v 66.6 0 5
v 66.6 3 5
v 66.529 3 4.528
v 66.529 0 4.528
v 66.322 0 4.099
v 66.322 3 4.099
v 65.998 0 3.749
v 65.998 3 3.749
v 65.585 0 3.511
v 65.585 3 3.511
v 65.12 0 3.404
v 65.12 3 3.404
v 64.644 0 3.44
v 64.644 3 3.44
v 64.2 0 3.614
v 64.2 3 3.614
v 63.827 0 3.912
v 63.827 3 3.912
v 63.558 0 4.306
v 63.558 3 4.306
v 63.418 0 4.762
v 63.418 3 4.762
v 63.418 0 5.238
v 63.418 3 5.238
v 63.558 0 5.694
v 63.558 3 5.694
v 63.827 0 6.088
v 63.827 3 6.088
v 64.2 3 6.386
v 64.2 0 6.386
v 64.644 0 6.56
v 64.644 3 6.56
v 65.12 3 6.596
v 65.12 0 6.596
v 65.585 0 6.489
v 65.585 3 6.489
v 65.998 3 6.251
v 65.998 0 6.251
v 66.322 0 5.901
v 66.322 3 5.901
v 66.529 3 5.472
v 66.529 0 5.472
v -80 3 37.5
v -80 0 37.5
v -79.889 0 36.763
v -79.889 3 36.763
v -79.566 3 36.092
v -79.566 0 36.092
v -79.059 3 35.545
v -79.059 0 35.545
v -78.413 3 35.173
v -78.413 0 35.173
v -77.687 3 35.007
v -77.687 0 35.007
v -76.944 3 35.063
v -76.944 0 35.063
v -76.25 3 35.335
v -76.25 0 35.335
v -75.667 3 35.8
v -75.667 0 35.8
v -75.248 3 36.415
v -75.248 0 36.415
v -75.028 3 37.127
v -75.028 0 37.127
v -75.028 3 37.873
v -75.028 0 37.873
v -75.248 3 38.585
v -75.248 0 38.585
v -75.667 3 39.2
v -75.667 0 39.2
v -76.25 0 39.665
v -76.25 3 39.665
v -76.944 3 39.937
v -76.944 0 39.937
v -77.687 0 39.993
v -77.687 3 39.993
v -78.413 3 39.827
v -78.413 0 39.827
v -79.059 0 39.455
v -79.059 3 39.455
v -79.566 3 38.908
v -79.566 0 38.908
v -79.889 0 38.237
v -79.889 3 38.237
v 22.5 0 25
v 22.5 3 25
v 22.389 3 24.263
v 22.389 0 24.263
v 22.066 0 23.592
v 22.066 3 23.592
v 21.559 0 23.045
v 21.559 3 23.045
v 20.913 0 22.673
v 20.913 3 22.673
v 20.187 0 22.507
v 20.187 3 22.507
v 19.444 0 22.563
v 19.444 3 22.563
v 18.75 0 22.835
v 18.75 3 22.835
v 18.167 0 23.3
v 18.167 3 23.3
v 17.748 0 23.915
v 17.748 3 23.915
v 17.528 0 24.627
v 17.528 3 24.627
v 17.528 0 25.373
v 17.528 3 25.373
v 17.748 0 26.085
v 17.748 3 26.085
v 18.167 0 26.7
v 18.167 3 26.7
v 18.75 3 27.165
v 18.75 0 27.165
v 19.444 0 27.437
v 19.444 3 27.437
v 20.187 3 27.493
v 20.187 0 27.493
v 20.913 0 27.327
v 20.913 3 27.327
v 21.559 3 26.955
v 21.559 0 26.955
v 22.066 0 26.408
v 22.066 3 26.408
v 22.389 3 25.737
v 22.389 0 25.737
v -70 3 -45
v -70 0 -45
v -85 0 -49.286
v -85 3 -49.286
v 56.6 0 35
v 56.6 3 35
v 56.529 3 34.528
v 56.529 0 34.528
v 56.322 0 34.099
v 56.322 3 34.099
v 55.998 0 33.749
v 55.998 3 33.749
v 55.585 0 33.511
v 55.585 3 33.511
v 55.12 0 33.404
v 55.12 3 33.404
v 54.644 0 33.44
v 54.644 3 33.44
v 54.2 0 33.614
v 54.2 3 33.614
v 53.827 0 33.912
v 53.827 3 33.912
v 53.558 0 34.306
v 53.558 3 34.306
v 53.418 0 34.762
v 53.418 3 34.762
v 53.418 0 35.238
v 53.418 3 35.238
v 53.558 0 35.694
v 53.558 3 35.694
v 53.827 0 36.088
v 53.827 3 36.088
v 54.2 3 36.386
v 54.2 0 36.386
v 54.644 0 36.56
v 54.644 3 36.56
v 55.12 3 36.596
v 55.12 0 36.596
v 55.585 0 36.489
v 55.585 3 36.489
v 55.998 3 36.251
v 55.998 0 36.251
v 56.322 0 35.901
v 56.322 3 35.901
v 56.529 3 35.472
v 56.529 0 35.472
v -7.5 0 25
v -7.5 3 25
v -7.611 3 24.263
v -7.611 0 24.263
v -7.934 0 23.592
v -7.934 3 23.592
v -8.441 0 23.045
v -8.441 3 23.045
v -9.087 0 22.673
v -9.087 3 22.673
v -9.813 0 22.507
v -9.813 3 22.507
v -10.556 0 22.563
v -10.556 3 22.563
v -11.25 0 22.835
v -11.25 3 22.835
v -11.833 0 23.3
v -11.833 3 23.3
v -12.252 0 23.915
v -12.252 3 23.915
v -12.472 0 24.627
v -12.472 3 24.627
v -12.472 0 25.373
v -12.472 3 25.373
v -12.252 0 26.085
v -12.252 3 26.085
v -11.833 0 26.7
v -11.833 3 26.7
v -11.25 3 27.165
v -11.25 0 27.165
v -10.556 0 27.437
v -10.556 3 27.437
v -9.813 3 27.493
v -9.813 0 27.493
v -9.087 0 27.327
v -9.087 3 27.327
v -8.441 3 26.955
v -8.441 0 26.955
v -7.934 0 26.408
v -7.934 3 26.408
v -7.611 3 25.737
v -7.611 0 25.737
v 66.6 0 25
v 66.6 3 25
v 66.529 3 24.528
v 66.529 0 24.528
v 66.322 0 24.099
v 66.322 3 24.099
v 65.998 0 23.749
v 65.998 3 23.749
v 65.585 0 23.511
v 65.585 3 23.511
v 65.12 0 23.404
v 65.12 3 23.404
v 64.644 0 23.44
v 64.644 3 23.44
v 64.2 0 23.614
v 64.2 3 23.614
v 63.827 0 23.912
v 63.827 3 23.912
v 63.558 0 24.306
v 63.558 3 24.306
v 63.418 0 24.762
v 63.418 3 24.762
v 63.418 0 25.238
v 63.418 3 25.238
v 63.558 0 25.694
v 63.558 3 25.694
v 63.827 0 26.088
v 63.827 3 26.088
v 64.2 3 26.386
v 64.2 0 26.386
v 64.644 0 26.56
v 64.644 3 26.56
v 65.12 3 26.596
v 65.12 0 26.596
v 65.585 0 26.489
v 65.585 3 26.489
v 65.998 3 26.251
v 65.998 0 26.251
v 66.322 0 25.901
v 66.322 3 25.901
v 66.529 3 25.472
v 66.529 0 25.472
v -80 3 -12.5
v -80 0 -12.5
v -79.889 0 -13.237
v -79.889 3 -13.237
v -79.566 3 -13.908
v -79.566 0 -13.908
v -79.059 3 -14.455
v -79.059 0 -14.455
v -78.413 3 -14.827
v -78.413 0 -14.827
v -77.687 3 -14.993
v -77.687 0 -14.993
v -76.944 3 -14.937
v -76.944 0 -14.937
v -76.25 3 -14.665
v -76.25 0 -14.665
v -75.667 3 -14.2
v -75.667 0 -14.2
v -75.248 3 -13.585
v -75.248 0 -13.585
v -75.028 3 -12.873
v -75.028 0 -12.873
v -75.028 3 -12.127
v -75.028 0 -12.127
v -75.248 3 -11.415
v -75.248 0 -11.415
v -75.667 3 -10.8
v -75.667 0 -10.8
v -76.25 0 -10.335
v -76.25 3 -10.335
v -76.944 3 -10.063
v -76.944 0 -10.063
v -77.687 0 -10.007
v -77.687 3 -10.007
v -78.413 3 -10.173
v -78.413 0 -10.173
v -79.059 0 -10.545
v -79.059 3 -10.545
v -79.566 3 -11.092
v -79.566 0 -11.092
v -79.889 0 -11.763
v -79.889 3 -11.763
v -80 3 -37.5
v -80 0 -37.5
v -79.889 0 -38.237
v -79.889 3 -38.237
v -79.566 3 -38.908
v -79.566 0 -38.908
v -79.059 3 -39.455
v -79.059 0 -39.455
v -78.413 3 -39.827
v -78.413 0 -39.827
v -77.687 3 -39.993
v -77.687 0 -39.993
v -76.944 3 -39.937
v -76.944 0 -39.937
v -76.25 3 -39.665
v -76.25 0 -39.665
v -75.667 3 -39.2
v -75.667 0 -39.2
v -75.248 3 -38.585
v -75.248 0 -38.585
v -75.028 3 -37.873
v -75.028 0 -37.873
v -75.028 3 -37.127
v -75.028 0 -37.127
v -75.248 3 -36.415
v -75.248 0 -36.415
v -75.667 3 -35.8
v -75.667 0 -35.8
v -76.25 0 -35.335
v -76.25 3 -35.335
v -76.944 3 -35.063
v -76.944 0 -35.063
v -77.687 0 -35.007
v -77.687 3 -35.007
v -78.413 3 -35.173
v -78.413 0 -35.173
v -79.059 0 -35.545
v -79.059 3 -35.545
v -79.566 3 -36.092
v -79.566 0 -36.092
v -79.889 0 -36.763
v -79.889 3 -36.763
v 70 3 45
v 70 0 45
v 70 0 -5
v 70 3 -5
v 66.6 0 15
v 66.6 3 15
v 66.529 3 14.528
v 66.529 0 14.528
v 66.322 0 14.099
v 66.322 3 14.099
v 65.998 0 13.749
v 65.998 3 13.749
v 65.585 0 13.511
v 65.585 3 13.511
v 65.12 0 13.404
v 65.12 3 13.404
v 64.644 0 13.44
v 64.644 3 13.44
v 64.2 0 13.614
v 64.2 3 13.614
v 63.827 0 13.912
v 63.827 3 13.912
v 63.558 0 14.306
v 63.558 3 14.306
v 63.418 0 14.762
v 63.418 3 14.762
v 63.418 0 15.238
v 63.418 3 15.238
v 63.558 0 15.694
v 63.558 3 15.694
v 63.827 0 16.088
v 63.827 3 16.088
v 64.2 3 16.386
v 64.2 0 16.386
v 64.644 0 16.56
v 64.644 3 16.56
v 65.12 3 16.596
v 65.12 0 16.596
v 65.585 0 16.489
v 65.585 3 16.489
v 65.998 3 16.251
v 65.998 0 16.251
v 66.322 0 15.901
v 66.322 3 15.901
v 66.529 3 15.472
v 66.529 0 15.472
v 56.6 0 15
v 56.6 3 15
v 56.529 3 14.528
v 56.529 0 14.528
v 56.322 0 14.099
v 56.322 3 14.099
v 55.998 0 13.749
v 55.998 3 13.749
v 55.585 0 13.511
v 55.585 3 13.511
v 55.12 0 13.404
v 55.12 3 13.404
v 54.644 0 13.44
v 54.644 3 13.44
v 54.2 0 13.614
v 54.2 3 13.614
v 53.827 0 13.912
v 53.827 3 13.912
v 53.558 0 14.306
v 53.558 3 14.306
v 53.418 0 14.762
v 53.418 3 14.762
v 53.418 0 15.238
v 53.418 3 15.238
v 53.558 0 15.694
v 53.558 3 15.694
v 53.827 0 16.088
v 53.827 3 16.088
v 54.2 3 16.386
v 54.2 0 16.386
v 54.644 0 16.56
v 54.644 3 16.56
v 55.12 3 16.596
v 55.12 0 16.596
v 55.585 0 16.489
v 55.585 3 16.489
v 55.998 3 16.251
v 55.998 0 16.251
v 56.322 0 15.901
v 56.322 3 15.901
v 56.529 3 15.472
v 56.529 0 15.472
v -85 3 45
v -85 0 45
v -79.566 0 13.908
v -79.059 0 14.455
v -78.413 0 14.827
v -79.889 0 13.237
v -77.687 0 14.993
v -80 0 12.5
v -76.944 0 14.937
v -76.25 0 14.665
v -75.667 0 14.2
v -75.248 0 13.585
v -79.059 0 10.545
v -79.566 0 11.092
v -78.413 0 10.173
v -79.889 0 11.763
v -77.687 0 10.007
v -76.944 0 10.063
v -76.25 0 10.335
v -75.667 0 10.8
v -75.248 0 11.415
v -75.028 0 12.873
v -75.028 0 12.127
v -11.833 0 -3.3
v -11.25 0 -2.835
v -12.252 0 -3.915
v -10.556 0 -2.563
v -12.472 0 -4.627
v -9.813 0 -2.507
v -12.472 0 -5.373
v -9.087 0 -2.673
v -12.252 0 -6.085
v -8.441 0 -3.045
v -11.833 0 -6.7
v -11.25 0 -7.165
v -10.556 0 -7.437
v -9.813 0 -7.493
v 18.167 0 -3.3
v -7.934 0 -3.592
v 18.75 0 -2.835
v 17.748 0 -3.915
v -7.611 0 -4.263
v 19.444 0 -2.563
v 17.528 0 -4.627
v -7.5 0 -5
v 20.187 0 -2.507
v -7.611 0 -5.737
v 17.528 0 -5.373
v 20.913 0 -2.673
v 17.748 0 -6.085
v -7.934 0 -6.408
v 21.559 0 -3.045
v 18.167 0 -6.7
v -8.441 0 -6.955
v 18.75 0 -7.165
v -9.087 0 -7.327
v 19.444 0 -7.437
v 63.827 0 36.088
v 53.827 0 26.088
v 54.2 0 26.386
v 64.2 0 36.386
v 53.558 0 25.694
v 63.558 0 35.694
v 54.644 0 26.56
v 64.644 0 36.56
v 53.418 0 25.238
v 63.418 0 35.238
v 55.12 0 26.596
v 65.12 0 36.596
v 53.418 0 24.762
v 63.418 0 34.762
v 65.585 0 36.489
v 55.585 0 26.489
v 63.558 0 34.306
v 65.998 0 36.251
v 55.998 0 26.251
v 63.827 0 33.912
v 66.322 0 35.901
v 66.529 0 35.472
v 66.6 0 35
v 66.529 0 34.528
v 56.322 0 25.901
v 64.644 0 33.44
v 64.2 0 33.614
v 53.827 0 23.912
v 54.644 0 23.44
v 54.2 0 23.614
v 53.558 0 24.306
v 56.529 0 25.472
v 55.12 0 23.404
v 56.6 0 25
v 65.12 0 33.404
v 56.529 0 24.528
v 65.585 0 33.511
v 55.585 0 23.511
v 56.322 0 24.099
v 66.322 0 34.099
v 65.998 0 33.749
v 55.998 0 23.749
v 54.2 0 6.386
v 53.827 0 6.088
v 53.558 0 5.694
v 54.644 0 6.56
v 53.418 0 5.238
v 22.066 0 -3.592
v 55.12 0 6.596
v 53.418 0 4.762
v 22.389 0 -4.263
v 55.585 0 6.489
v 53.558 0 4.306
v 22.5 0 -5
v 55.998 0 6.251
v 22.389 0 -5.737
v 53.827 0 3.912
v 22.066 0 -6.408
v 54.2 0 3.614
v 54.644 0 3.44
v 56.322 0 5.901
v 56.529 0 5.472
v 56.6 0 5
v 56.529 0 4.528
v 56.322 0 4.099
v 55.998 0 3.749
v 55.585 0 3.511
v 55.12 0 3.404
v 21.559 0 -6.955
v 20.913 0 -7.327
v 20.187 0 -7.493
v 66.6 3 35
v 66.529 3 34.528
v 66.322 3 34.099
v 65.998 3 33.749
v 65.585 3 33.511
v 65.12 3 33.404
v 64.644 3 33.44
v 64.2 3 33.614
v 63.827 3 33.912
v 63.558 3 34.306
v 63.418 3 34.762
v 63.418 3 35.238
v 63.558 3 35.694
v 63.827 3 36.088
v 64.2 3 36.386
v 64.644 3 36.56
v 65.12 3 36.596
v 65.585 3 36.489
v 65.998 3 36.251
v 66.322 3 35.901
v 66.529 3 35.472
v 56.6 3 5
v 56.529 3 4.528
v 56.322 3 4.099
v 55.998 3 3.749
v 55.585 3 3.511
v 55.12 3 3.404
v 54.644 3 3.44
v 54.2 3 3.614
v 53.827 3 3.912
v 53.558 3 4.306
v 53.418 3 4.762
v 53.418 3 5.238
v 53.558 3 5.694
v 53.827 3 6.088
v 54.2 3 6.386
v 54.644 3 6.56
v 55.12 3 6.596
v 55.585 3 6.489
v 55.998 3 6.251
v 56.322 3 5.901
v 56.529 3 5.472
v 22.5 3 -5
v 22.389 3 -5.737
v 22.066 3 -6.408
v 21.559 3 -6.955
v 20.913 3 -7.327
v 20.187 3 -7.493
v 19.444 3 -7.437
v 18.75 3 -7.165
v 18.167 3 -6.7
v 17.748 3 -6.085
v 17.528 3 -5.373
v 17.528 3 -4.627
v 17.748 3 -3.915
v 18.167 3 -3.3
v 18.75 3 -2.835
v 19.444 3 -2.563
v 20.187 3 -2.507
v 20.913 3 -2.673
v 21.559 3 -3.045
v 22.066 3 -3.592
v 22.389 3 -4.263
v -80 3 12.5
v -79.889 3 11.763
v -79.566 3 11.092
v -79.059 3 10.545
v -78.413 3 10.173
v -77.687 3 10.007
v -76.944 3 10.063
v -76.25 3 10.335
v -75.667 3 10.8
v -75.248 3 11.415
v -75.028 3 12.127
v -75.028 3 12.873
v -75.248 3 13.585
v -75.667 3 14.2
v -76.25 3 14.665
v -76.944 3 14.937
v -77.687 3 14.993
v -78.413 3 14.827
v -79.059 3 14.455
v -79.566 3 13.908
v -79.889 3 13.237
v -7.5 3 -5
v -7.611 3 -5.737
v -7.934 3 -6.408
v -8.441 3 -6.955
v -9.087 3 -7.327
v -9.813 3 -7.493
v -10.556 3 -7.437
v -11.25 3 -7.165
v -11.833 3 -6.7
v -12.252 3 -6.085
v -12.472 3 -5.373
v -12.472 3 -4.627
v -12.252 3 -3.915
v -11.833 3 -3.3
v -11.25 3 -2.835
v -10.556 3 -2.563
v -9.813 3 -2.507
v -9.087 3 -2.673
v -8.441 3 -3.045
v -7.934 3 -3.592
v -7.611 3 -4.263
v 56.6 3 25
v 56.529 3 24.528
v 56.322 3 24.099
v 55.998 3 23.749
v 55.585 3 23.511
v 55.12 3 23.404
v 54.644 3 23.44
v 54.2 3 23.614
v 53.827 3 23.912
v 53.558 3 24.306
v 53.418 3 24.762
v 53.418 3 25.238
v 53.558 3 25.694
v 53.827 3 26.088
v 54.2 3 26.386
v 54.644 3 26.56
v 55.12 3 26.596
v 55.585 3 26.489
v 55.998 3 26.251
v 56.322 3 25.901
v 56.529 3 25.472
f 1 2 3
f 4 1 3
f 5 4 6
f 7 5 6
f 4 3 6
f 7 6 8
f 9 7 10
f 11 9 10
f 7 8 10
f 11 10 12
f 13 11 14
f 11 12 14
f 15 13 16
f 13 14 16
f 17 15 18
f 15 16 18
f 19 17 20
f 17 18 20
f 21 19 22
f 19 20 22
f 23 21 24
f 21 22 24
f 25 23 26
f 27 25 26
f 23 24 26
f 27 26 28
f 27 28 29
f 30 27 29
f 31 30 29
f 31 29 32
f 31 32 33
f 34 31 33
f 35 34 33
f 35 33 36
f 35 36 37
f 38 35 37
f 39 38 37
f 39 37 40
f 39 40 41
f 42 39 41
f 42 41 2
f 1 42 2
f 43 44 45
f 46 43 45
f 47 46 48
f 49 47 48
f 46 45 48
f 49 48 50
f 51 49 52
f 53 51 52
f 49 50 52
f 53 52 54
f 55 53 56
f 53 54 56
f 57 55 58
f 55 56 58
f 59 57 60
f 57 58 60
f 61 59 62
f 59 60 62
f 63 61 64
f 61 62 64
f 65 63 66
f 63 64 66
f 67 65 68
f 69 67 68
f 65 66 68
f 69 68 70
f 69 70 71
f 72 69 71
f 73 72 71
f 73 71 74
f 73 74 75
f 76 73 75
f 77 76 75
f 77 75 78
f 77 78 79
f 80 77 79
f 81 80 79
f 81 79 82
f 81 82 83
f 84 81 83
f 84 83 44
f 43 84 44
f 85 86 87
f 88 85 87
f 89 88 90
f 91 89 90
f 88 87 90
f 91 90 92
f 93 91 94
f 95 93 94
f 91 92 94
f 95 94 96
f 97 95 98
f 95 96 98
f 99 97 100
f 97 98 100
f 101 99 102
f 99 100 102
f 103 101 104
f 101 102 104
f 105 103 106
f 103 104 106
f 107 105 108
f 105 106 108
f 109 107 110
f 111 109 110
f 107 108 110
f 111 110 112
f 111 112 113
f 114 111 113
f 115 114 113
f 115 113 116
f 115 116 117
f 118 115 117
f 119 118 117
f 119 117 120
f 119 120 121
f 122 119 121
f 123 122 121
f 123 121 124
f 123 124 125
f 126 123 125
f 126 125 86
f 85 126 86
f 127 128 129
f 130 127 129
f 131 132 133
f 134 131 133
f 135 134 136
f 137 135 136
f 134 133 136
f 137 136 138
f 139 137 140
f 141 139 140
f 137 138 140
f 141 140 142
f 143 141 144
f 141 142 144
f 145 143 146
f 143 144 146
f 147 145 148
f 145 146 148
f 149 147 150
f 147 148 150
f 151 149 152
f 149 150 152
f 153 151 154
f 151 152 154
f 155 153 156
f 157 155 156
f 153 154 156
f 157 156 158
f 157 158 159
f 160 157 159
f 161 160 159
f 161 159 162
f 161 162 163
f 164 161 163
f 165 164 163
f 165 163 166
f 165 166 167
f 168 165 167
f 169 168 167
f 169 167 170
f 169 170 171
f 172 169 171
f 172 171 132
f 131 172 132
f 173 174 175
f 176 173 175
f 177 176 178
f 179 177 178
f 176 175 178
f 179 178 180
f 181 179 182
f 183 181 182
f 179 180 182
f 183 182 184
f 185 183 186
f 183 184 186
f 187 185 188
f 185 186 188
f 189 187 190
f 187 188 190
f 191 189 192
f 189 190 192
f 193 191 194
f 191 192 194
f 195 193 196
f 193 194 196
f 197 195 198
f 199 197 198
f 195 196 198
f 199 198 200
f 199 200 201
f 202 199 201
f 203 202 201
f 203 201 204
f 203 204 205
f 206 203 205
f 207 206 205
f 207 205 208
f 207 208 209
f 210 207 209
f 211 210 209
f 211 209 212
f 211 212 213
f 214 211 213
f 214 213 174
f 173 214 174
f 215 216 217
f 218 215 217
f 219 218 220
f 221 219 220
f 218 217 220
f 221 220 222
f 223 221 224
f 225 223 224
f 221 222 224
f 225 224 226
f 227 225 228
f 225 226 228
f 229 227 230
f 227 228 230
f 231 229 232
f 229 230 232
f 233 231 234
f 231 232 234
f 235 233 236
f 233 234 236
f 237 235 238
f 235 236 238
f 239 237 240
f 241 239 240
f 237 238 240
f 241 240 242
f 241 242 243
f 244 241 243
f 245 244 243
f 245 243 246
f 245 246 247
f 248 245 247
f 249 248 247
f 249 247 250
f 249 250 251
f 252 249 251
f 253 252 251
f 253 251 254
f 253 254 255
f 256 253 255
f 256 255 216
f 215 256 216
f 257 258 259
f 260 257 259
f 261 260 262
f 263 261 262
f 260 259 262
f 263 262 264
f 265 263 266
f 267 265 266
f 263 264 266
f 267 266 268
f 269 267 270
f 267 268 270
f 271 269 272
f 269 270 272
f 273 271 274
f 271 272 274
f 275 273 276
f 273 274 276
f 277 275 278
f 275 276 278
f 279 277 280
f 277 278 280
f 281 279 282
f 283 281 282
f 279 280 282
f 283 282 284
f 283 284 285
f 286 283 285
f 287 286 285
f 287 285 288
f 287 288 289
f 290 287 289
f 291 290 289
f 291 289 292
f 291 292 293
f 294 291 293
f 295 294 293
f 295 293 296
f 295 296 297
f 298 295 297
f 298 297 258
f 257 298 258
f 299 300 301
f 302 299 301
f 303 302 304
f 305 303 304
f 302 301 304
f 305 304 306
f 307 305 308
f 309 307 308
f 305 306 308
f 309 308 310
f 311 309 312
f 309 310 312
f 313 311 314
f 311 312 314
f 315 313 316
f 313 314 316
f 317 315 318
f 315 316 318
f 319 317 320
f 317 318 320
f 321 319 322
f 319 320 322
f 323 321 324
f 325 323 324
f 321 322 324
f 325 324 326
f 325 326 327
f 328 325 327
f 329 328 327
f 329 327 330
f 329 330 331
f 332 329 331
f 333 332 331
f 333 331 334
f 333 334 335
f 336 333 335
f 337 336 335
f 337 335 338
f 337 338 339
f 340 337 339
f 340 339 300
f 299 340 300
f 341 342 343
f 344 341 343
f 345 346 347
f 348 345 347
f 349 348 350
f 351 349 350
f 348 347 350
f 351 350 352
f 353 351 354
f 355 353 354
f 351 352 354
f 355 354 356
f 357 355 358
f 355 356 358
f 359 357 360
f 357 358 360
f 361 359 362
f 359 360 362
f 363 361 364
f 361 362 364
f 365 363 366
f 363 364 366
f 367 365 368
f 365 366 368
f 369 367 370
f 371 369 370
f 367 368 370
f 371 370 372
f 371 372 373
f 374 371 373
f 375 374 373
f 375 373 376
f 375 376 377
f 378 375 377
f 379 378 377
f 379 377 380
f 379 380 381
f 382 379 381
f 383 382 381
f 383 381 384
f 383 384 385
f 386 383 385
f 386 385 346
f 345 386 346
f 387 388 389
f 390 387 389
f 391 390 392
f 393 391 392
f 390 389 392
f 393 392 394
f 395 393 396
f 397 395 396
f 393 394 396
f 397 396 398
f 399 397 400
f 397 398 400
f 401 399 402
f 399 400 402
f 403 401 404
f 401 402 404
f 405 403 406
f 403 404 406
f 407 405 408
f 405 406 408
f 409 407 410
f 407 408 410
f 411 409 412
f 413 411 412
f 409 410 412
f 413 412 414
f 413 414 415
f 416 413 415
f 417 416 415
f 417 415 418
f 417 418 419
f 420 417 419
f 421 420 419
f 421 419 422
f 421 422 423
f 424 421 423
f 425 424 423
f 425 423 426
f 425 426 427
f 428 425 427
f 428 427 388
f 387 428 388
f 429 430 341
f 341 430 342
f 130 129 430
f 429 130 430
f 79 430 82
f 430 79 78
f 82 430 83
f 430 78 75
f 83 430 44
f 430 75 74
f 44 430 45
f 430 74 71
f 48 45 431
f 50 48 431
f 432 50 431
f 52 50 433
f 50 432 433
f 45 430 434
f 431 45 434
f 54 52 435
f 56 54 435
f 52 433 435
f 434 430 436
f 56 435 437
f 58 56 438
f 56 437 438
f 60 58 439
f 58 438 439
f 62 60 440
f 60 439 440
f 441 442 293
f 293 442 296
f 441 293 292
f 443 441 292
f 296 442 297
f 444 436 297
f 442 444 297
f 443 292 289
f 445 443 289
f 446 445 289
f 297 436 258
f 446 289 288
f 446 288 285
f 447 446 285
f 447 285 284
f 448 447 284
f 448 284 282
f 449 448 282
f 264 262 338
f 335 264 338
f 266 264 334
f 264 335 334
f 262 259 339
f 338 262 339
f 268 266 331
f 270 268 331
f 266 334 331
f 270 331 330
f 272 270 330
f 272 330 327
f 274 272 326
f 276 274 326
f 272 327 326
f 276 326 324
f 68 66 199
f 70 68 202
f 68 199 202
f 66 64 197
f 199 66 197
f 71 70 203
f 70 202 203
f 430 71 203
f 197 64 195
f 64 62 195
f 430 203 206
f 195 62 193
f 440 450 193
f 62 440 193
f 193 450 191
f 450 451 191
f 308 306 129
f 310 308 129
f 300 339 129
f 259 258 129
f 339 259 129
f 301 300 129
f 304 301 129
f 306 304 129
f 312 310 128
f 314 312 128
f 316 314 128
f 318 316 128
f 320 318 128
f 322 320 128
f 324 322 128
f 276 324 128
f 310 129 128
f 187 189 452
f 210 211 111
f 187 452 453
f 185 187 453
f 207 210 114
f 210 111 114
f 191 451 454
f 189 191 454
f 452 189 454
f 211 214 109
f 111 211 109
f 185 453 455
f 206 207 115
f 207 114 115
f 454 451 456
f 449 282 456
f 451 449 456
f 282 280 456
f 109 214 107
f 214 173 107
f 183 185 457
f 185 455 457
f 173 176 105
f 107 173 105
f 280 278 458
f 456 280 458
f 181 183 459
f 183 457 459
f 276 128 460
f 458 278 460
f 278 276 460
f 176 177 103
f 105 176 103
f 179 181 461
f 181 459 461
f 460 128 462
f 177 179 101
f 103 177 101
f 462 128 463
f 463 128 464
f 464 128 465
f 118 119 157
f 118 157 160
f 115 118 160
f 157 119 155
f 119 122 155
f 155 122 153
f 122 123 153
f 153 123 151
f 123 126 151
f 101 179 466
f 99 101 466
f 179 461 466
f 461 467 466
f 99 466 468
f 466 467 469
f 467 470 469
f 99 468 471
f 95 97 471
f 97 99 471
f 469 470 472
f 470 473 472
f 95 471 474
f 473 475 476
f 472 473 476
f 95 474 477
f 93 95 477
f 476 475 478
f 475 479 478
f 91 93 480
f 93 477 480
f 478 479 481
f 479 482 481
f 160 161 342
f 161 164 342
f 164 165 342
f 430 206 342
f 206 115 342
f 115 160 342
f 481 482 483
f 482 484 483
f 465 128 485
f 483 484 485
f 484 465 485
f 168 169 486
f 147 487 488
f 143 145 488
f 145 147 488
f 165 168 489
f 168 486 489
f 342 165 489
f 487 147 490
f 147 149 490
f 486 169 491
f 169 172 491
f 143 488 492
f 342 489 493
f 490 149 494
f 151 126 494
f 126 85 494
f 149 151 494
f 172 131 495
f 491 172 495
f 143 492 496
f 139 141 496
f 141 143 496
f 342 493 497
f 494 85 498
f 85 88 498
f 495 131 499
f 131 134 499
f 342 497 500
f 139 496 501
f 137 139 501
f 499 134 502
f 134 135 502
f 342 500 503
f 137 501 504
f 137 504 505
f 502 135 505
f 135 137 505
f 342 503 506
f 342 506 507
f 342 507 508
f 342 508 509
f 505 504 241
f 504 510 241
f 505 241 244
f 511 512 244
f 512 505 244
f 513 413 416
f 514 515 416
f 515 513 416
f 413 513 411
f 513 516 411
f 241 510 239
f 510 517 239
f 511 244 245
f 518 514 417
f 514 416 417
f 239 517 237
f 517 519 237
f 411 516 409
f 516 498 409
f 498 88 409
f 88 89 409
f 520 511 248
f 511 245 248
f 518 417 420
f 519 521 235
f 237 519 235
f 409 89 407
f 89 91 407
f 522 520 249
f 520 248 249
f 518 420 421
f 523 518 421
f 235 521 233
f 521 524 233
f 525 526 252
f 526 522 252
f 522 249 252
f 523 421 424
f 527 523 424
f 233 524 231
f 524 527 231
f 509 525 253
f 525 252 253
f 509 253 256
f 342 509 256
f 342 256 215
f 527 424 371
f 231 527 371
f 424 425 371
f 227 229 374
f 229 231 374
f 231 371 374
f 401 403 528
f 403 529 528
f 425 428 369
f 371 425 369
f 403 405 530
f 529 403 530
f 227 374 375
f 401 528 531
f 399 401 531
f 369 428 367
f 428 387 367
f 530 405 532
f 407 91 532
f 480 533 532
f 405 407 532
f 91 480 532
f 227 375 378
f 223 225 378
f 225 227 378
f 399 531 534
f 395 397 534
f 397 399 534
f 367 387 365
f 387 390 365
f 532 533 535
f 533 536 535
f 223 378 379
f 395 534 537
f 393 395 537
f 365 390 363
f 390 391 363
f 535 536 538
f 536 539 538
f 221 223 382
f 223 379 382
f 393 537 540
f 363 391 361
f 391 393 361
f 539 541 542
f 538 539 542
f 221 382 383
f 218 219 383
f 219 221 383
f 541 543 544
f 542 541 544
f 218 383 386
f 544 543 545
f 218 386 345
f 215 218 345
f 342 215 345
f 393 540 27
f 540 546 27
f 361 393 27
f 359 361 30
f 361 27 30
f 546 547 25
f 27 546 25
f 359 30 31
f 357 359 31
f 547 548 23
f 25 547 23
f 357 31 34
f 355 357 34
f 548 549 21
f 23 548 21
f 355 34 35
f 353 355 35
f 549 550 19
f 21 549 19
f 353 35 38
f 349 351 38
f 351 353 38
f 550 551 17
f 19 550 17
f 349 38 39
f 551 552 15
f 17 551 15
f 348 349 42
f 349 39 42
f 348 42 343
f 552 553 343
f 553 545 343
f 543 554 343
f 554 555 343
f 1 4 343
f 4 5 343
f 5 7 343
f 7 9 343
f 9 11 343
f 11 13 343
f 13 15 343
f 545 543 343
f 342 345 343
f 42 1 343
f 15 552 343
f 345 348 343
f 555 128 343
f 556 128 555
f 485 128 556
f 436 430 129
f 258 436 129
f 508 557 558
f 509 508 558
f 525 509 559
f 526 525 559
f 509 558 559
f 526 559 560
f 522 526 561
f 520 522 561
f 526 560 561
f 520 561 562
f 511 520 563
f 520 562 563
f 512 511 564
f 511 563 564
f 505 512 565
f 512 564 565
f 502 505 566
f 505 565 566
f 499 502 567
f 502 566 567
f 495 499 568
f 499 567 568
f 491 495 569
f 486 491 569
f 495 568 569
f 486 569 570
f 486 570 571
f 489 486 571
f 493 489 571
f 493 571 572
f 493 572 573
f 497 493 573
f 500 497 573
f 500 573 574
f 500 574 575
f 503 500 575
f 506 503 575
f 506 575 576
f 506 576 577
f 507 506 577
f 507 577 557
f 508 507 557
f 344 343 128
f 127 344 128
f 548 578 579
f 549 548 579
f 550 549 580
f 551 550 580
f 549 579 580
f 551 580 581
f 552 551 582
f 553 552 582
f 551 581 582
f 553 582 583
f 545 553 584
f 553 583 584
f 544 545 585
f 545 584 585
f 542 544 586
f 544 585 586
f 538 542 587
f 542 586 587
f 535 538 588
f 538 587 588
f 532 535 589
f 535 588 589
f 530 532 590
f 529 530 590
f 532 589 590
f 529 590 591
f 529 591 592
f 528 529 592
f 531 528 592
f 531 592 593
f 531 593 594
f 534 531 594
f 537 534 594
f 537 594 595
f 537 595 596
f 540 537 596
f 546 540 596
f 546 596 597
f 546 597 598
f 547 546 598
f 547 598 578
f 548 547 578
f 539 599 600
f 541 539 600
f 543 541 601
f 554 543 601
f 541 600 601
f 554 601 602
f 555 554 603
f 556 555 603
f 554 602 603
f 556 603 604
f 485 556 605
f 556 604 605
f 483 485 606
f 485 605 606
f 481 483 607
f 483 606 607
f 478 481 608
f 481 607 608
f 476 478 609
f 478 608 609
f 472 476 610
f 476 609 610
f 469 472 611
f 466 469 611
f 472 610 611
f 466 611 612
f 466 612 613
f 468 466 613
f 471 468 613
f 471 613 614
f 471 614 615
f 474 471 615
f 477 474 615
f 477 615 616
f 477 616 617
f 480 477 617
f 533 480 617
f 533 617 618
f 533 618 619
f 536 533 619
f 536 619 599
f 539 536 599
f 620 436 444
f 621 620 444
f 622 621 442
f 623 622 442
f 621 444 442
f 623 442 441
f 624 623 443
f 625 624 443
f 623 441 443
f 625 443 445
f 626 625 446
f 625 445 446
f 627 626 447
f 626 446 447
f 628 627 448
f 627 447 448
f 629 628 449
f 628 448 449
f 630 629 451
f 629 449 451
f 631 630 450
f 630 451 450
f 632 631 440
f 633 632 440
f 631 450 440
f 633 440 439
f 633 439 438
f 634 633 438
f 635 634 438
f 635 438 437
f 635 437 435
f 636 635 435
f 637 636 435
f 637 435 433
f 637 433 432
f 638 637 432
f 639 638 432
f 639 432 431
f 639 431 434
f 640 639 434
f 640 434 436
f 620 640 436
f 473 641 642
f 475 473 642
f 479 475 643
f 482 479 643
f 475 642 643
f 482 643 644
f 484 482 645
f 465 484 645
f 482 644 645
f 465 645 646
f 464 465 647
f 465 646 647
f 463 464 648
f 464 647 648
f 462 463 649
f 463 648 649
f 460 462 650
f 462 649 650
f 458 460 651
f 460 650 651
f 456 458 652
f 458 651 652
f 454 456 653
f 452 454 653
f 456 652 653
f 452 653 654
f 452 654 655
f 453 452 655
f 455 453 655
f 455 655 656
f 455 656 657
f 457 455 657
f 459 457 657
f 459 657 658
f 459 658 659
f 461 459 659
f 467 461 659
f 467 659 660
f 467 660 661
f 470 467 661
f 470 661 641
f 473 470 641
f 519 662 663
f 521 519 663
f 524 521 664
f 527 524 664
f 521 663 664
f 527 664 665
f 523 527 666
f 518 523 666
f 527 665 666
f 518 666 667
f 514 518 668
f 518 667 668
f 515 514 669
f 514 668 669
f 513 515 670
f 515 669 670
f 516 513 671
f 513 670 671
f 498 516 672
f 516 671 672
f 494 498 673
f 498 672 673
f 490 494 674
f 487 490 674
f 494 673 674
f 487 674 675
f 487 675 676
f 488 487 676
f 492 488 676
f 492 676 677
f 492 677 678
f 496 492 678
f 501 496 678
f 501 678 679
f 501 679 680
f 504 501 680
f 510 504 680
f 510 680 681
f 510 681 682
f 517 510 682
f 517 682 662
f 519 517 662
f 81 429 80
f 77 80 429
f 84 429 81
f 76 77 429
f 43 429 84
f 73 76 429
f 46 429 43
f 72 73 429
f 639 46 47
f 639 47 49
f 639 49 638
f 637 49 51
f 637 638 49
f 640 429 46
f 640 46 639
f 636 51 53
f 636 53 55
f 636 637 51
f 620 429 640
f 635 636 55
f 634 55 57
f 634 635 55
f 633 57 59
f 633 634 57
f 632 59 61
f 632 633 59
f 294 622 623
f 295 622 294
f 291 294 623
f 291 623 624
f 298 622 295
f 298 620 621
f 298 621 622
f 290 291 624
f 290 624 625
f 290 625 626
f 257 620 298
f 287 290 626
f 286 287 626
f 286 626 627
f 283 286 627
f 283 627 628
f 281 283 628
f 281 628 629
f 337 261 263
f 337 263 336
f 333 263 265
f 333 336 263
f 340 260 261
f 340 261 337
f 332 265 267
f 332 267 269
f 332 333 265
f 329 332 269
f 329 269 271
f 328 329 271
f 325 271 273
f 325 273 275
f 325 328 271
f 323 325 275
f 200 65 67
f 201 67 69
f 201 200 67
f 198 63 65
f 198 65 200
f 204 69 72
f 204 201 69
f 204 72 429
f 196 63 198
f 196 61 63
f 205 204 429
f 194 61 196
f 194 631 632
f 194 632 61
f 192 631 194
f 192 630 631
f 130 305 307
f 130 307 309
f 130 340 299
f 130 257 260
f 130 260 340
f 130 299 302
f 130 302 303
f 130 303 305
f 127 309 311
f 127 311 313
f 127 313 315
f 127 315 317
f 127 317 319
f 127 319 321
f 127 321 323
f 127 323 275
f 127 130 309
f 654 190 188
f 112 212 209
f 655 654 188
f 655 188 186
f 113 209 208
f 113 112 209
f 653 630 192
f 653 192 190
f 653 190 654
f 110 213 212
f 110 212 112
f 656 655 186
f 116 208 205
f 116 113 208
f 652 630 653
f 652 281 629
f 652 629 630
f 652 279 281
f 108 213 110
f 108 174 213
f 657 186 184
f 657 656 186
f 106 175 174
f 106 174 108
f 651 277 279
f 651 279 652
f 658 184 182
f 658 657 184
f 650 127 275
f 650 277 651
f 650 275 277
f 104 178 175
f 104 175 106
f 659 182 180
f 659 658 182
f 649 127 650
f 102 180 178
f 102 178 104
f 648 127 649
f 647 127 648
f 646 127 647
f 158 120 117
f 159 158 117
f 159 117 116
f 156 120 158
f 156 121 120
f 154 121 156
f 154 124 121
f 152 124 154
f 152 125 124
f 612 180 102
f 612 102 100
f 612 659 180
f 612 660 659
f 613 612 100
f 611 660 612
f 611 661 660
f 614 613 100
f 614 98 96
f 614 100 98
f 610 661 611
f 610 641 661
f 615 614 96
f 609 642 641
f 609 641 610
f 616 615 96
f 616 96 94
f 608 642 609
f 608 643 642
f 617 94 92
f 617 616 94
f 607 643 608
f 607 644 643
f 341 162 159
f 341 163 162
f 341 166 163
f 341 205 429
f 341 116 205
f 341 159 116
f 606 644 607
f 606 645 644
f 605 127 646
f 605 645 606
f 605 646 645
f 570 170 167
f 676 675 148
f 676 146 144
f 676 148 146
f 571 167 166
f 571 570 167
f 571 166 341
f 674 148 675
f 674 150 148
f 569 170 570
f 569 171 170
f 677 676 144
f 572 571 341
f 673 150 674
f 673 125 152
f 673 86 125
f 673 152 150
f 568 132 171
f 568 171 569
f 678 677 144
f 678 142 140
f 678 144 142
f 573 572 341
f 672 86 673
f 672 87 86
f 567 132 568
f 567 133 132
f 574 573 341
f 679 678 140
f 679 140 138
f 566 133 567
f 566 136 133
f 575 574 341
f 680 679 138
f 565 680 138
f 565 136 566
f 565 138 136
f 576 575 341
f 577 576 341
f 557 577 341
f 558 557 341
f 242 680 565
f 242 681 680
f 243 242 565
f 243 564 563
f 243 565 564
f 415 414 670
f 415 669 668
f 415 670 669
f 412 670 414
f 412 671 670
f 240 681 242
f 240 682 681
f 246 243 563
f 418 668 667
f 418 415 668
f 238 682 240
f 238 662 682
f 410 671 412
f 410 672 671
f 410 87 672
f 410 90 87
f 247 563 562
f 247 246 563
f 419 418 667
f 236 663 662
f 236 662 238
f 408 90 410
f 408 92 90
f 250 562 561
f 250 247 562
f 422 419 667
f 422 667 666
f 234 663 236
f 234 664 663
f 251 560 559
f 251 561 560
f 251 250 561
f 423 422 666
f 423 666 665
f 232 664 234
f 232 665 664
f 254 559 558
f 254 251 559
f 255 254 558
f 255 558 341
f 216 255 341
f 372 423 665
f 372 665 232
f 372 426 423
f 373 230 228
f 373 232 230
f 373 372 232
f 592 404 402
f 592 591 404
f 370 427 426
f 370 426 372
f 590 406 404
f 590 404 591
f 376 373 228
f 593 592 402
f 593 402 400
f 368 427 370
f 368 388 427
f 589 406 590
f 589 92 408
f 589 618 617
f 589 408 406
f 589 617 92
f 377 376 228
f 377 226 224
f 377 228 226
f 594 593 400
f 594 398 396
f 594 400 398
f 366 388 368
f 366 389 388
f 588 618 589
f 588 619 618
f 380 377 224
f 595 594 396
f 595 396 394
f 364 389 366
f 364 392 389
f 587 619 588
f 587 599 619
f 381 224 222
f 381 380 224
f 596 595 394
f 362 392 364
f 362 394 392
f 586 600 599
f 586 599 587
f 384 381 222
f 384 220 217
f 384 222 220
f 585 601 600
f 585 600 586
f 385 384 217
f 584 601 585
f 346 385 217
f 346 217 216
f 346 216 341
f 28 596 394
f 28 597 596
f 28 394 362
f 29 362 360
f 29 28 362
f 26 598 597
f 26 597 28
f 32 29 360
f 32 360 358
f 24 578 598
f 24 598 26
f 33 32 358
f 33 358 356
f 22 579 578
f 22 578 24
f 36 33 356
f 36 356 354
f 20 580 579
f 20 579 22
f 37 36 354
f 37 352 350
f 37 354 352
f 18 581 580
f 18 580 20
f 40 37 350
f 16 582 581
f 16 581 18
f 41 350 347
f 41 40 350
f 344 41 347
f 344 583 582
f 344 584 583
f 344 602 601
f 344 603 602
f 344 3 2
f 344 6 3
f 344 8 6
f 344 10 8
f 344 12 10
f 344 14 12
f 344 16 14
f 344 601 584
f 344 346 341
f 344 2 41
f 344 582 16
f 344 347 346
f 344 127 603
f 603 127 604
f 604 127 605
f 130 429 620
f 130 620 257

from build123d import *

# Parameters (mm, degrees)
EXTRUDE_1_DEPTH             = 3
HOLE_WIZARD_5_0_5_2_D       = 5
HOLE_WIZARD_5_0_5_1_D       = 5
HOLE_WIZARD_3_2_3_2_2_D     = 3.2
PATTERN_LINEAR_1_COUNT      = 4
PATTERN_LINEAR_1_PITCH      = 10
PATTERN_LINEAR_1_COUNT_DIR2 = 2
PATTERN_LINEAR_1_PITCH_DIR2 = 10


with BuildPart() as part:
    # 草图1 → 凸台-拉伸1 (new body)
    with BuildSketch(Plane(origin=(0, 0, 0), x_dir=(1, 0, 0), z_dir=(0, 1, 0))):
        Polygon((-85, -45), (70, -45), (70, 5), (-70, 45), (-85, 45), align=None)
        Polygon((-85, 45), (-70, 45), (-85, 49.285714286), align=None)
    extrude(amount=EXTRUDE_1_DEPTH)

    # Ø5.0 (5) 直径孔2 (through all)
    with Locations(Plane(origin=(0, 3, 0), x_dir=(1, 0, 0), z_dir=(0, 1, 0))):
        with Locations((-77.5, -37.5), (-77.5, -12.5), (-77.5, 37.5), (-77.5, 12.5)):
            Hole(HOLE_WIZARD_5_0_5_2_D / 2)

    # Ø5.0 (5) 直径孔1 (through all)
    with Locations(Plane(origin=(0, 0, 0), x_dir=(-1, 0, 0), z_dir=(0, -1, 0))):
        with Locations((10, -25), (10, 5), (-20, 5), (-20, -25)):
            Hole(HOLE_WIZARD_5_0_5_1_D / 2)

    # Ø3.2 (3.2) 直径孔2 (through all)
    with Locations(Plane(origin=(0, 0, 0), x_dir=(-1, 0, 0), z_dir=(0, -1, 0))):
        with Locations((-65, -35)):
            hole_wizard_3_2_3_2_2 = Hole(HOLE_WIZARD_3_2_3_2_2_D / 2)

    # 阵列(线性)1: Hole Wizard 3.2 _3.2_ _2 4 × 2
    with Locations(*[(-j * PATTERN_LINEAR_1_PITCH_DIR2, 0, -i * PATTERN_LINEAR_1_PITCH) for i in range(PATTERN_LINEAR_1_COUNT) for j in range(PATTERN_LINEAR_1_COUNT_DIR2) if (i, j) != (0, 0)]):
        add(hole_wizard_3_2_3_2_2, mode=Mode.SUBTRACT)


solid = part.part
